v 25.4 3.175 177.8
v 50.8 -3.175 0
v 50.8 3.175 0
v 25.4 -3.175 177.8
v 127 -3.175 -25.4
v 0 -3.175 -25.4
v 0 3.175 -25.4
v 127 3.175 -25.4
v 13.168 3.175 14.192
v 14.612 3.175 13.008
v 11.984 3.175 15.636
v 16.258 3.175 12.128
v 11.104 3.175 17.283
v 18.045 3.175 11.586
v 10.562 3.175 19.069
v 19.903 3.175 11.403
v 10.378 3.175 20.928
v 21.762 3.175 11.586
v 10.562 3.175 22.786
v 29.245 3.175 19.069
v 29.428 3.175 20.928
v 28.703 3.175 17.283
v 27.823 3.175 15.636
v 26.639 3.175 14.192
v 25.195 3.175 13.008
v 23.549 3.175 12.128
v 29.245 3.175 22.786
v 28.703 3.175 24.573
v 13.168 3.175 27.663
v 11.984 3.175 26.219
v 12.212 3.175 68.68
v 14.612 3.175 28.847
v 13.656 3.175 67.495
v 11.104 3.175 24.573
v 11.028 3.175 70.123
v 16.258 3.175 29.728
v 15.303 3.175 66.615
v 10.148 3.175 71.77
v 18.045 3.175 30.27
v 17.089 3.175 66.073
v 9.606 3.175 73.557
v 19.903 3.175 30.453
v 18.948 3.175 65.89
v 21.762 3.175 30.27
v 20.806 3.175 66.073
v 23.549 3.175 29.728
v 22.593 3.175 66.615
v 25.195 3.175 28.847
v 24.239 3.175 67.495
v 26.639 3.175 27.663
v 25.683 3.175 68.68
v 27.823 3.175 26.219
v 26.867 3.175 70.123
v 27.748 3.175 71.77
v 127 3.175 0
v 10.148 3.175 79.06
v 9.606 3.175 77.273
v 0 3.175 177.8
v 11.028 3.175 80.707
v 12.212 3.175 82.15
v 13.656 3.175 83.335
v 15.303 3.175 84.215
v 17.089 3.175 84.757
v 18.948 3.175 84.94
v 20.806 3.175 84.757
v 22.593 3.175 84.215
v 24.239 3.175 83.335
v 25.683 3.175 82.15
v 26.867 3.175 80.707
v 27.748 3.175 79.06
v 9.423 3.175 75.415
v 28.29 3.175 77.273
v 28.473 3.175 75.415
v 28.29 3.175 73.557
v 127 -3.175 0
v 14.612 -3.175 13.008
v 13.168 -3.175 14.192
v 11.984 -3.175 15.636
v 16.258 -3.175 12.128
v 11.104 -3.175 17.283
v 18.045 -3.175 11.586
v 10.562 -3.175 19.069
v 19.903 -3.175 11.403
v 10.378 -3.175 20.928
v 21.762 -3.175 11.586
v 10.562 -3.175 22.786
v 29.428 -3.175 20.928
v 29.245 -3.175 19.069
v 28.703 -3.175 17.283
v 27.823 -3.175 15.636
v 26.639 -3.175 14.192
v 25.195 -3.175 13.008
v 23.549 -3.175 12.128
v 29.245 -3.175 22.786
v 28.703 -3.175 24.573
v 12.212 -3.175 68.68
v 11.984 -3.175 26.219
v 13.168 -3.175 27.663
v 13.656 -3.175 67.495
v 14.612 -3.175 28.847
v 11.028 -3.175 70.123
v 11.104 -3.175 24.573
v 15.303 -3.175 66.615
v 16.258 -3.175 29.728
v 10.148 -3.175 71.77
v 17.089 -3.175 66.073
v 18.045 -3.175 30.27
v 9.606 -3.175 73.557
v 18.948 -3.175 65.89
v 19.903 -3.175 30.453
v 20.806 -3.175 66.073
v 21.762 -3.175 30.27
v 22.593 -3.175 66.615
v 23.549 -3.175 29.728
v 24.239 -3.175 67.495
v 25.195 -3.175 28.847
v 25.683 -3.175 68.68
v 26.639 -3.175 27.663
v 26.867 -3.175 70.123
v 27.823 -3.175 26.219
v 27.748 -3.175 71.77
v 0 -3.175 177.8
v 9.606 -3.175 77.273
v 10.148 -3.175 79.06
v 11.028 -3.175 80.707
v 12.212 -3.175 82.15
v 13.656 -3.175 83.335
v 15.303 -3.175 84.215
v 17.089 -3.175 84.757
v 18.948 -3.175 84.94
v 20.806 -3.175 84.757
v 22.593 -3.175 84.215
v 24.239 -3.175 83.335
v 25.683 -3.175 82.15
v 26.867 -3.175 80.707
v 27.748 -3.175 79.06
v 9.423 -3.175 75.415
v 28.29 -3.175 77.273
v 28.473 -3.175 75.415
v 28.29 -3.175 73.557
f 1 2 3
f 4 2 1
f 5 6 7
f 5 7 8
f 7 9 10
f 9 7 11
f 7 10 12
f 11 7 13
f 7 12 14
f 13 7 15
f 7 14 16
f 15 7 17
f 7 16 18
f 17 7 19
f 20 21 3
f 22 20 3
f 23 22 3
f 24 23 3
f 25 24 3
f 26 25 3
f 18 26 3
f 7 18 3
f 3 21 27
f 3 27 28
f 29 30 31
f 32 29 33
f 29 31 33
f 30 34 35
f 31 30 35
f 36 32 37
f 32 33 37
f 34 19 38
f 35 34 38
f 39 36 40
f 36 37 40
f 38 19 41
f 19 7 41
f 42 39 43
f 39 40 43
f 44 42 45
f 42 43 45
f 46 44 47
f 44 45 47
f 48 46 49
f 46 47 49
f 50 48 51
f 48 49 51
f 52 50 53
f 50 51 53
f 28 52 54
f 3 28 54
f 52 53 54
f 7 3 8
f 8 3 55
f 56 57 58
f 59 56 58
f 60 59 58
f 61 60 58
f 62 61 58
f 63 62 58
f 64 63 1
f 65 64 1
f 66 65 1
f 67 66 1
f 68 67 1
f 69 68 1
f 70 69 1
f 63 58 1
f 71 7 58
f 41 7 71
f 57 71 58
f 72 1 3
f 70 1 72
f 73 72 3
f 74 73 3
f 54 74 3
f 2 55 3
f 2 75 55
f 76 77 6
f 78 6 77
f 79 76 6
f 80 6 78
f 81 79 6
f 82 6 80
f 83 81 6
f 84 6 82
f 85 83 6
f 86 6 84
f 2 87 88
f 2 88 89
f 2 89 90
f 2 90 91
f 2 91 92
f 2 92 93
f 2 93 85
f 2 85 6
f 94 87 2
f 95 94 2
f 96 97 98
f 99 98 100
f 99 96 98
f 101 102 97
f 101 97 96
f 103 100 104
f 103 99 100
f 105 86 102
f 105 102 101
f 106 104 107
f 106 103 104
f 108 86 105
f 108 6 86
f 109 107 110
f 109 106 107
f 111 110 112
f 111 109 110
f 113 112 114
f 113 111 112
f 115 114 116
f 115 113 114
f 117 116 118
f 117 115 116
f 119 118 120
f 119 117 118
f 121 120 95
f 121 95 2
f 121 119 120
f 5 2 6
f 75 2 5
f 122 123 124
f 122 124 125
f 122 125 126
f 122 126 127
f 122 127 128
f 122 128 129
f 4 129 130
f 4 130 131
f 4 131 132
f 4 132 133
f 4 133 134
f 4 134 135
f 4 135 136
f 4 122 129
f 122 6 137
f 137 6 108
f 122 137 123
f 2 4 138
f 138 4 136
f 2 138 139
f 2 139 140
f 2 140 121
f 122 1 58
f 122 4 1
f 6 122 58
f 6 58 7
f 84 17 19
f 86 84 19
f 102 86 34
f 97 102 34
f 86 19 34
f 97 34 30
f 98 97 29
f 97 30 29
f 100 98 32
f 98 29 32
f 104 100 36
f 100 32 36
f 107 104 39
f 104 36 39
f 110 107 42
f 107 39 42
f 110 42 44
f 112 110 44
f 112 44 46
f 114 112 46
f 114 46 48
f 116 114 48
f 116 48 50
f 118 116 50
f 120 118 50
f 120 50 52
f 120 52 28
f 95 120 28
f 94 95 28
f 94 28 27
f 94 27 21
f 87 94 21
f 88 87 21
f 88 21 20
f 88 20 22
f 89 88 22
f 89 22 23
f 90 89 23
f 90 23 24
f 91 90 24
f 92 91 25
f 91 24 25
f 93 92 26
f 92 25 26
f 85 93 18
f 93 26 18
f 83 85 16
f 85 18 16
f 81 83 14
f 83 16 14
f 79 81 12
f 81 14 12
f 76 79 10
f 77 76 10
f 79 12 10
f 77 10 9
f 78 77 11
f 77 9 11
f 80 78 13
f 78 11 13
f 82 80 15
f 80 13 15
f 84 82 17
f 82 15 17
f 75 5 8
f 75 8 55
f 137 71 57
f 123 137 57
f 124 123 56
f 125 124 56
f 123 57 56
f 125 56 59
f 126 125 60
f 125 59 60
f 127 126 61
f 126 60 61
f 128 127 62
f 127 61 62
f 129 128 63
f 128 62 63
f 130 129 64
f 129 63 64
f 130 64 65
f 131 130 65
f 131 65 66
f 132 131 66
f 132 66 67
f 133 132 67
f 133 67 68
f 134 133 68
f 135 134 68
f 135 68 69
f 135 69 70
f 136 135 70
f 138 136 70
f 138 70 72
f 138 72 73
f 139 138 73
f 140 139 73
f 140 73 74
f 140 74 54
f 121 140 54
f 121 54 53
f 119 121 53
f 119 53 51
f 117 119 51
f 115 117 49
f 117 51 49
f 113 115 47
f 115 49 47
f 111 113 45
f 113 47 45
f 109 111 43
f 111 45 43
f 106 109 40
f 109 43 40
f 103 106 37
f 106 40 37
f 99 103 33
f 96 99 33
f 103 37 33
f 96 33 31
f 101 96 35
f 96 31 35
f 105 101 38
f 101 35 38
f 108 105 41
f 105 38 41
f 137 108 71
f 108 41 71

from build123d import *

# Parameters (mm, degrees)
F1_DEPTH = 3.175
F3_D     = 19.05


with BuildPart() as f1:
    # F0 (on Front) → F1 (new body, symmetric)
    with BuildSketch(Plane.XZ):
        Polygon((25.4, 177.8), (0, 177.8), (0, -25.4), (127, -25.4), (127, 0), (50.8, 0), align=None)
    extrude(amount=F1_DEPTH, both=True)

    # F3 (through all)
    with Locations(Plane.XZ.offset(3.175)):
        with Locations((18.947579, 75.414784), (19.903496, 20.927686)):
            Hole(F3_D / 2)


solid = f1.part
